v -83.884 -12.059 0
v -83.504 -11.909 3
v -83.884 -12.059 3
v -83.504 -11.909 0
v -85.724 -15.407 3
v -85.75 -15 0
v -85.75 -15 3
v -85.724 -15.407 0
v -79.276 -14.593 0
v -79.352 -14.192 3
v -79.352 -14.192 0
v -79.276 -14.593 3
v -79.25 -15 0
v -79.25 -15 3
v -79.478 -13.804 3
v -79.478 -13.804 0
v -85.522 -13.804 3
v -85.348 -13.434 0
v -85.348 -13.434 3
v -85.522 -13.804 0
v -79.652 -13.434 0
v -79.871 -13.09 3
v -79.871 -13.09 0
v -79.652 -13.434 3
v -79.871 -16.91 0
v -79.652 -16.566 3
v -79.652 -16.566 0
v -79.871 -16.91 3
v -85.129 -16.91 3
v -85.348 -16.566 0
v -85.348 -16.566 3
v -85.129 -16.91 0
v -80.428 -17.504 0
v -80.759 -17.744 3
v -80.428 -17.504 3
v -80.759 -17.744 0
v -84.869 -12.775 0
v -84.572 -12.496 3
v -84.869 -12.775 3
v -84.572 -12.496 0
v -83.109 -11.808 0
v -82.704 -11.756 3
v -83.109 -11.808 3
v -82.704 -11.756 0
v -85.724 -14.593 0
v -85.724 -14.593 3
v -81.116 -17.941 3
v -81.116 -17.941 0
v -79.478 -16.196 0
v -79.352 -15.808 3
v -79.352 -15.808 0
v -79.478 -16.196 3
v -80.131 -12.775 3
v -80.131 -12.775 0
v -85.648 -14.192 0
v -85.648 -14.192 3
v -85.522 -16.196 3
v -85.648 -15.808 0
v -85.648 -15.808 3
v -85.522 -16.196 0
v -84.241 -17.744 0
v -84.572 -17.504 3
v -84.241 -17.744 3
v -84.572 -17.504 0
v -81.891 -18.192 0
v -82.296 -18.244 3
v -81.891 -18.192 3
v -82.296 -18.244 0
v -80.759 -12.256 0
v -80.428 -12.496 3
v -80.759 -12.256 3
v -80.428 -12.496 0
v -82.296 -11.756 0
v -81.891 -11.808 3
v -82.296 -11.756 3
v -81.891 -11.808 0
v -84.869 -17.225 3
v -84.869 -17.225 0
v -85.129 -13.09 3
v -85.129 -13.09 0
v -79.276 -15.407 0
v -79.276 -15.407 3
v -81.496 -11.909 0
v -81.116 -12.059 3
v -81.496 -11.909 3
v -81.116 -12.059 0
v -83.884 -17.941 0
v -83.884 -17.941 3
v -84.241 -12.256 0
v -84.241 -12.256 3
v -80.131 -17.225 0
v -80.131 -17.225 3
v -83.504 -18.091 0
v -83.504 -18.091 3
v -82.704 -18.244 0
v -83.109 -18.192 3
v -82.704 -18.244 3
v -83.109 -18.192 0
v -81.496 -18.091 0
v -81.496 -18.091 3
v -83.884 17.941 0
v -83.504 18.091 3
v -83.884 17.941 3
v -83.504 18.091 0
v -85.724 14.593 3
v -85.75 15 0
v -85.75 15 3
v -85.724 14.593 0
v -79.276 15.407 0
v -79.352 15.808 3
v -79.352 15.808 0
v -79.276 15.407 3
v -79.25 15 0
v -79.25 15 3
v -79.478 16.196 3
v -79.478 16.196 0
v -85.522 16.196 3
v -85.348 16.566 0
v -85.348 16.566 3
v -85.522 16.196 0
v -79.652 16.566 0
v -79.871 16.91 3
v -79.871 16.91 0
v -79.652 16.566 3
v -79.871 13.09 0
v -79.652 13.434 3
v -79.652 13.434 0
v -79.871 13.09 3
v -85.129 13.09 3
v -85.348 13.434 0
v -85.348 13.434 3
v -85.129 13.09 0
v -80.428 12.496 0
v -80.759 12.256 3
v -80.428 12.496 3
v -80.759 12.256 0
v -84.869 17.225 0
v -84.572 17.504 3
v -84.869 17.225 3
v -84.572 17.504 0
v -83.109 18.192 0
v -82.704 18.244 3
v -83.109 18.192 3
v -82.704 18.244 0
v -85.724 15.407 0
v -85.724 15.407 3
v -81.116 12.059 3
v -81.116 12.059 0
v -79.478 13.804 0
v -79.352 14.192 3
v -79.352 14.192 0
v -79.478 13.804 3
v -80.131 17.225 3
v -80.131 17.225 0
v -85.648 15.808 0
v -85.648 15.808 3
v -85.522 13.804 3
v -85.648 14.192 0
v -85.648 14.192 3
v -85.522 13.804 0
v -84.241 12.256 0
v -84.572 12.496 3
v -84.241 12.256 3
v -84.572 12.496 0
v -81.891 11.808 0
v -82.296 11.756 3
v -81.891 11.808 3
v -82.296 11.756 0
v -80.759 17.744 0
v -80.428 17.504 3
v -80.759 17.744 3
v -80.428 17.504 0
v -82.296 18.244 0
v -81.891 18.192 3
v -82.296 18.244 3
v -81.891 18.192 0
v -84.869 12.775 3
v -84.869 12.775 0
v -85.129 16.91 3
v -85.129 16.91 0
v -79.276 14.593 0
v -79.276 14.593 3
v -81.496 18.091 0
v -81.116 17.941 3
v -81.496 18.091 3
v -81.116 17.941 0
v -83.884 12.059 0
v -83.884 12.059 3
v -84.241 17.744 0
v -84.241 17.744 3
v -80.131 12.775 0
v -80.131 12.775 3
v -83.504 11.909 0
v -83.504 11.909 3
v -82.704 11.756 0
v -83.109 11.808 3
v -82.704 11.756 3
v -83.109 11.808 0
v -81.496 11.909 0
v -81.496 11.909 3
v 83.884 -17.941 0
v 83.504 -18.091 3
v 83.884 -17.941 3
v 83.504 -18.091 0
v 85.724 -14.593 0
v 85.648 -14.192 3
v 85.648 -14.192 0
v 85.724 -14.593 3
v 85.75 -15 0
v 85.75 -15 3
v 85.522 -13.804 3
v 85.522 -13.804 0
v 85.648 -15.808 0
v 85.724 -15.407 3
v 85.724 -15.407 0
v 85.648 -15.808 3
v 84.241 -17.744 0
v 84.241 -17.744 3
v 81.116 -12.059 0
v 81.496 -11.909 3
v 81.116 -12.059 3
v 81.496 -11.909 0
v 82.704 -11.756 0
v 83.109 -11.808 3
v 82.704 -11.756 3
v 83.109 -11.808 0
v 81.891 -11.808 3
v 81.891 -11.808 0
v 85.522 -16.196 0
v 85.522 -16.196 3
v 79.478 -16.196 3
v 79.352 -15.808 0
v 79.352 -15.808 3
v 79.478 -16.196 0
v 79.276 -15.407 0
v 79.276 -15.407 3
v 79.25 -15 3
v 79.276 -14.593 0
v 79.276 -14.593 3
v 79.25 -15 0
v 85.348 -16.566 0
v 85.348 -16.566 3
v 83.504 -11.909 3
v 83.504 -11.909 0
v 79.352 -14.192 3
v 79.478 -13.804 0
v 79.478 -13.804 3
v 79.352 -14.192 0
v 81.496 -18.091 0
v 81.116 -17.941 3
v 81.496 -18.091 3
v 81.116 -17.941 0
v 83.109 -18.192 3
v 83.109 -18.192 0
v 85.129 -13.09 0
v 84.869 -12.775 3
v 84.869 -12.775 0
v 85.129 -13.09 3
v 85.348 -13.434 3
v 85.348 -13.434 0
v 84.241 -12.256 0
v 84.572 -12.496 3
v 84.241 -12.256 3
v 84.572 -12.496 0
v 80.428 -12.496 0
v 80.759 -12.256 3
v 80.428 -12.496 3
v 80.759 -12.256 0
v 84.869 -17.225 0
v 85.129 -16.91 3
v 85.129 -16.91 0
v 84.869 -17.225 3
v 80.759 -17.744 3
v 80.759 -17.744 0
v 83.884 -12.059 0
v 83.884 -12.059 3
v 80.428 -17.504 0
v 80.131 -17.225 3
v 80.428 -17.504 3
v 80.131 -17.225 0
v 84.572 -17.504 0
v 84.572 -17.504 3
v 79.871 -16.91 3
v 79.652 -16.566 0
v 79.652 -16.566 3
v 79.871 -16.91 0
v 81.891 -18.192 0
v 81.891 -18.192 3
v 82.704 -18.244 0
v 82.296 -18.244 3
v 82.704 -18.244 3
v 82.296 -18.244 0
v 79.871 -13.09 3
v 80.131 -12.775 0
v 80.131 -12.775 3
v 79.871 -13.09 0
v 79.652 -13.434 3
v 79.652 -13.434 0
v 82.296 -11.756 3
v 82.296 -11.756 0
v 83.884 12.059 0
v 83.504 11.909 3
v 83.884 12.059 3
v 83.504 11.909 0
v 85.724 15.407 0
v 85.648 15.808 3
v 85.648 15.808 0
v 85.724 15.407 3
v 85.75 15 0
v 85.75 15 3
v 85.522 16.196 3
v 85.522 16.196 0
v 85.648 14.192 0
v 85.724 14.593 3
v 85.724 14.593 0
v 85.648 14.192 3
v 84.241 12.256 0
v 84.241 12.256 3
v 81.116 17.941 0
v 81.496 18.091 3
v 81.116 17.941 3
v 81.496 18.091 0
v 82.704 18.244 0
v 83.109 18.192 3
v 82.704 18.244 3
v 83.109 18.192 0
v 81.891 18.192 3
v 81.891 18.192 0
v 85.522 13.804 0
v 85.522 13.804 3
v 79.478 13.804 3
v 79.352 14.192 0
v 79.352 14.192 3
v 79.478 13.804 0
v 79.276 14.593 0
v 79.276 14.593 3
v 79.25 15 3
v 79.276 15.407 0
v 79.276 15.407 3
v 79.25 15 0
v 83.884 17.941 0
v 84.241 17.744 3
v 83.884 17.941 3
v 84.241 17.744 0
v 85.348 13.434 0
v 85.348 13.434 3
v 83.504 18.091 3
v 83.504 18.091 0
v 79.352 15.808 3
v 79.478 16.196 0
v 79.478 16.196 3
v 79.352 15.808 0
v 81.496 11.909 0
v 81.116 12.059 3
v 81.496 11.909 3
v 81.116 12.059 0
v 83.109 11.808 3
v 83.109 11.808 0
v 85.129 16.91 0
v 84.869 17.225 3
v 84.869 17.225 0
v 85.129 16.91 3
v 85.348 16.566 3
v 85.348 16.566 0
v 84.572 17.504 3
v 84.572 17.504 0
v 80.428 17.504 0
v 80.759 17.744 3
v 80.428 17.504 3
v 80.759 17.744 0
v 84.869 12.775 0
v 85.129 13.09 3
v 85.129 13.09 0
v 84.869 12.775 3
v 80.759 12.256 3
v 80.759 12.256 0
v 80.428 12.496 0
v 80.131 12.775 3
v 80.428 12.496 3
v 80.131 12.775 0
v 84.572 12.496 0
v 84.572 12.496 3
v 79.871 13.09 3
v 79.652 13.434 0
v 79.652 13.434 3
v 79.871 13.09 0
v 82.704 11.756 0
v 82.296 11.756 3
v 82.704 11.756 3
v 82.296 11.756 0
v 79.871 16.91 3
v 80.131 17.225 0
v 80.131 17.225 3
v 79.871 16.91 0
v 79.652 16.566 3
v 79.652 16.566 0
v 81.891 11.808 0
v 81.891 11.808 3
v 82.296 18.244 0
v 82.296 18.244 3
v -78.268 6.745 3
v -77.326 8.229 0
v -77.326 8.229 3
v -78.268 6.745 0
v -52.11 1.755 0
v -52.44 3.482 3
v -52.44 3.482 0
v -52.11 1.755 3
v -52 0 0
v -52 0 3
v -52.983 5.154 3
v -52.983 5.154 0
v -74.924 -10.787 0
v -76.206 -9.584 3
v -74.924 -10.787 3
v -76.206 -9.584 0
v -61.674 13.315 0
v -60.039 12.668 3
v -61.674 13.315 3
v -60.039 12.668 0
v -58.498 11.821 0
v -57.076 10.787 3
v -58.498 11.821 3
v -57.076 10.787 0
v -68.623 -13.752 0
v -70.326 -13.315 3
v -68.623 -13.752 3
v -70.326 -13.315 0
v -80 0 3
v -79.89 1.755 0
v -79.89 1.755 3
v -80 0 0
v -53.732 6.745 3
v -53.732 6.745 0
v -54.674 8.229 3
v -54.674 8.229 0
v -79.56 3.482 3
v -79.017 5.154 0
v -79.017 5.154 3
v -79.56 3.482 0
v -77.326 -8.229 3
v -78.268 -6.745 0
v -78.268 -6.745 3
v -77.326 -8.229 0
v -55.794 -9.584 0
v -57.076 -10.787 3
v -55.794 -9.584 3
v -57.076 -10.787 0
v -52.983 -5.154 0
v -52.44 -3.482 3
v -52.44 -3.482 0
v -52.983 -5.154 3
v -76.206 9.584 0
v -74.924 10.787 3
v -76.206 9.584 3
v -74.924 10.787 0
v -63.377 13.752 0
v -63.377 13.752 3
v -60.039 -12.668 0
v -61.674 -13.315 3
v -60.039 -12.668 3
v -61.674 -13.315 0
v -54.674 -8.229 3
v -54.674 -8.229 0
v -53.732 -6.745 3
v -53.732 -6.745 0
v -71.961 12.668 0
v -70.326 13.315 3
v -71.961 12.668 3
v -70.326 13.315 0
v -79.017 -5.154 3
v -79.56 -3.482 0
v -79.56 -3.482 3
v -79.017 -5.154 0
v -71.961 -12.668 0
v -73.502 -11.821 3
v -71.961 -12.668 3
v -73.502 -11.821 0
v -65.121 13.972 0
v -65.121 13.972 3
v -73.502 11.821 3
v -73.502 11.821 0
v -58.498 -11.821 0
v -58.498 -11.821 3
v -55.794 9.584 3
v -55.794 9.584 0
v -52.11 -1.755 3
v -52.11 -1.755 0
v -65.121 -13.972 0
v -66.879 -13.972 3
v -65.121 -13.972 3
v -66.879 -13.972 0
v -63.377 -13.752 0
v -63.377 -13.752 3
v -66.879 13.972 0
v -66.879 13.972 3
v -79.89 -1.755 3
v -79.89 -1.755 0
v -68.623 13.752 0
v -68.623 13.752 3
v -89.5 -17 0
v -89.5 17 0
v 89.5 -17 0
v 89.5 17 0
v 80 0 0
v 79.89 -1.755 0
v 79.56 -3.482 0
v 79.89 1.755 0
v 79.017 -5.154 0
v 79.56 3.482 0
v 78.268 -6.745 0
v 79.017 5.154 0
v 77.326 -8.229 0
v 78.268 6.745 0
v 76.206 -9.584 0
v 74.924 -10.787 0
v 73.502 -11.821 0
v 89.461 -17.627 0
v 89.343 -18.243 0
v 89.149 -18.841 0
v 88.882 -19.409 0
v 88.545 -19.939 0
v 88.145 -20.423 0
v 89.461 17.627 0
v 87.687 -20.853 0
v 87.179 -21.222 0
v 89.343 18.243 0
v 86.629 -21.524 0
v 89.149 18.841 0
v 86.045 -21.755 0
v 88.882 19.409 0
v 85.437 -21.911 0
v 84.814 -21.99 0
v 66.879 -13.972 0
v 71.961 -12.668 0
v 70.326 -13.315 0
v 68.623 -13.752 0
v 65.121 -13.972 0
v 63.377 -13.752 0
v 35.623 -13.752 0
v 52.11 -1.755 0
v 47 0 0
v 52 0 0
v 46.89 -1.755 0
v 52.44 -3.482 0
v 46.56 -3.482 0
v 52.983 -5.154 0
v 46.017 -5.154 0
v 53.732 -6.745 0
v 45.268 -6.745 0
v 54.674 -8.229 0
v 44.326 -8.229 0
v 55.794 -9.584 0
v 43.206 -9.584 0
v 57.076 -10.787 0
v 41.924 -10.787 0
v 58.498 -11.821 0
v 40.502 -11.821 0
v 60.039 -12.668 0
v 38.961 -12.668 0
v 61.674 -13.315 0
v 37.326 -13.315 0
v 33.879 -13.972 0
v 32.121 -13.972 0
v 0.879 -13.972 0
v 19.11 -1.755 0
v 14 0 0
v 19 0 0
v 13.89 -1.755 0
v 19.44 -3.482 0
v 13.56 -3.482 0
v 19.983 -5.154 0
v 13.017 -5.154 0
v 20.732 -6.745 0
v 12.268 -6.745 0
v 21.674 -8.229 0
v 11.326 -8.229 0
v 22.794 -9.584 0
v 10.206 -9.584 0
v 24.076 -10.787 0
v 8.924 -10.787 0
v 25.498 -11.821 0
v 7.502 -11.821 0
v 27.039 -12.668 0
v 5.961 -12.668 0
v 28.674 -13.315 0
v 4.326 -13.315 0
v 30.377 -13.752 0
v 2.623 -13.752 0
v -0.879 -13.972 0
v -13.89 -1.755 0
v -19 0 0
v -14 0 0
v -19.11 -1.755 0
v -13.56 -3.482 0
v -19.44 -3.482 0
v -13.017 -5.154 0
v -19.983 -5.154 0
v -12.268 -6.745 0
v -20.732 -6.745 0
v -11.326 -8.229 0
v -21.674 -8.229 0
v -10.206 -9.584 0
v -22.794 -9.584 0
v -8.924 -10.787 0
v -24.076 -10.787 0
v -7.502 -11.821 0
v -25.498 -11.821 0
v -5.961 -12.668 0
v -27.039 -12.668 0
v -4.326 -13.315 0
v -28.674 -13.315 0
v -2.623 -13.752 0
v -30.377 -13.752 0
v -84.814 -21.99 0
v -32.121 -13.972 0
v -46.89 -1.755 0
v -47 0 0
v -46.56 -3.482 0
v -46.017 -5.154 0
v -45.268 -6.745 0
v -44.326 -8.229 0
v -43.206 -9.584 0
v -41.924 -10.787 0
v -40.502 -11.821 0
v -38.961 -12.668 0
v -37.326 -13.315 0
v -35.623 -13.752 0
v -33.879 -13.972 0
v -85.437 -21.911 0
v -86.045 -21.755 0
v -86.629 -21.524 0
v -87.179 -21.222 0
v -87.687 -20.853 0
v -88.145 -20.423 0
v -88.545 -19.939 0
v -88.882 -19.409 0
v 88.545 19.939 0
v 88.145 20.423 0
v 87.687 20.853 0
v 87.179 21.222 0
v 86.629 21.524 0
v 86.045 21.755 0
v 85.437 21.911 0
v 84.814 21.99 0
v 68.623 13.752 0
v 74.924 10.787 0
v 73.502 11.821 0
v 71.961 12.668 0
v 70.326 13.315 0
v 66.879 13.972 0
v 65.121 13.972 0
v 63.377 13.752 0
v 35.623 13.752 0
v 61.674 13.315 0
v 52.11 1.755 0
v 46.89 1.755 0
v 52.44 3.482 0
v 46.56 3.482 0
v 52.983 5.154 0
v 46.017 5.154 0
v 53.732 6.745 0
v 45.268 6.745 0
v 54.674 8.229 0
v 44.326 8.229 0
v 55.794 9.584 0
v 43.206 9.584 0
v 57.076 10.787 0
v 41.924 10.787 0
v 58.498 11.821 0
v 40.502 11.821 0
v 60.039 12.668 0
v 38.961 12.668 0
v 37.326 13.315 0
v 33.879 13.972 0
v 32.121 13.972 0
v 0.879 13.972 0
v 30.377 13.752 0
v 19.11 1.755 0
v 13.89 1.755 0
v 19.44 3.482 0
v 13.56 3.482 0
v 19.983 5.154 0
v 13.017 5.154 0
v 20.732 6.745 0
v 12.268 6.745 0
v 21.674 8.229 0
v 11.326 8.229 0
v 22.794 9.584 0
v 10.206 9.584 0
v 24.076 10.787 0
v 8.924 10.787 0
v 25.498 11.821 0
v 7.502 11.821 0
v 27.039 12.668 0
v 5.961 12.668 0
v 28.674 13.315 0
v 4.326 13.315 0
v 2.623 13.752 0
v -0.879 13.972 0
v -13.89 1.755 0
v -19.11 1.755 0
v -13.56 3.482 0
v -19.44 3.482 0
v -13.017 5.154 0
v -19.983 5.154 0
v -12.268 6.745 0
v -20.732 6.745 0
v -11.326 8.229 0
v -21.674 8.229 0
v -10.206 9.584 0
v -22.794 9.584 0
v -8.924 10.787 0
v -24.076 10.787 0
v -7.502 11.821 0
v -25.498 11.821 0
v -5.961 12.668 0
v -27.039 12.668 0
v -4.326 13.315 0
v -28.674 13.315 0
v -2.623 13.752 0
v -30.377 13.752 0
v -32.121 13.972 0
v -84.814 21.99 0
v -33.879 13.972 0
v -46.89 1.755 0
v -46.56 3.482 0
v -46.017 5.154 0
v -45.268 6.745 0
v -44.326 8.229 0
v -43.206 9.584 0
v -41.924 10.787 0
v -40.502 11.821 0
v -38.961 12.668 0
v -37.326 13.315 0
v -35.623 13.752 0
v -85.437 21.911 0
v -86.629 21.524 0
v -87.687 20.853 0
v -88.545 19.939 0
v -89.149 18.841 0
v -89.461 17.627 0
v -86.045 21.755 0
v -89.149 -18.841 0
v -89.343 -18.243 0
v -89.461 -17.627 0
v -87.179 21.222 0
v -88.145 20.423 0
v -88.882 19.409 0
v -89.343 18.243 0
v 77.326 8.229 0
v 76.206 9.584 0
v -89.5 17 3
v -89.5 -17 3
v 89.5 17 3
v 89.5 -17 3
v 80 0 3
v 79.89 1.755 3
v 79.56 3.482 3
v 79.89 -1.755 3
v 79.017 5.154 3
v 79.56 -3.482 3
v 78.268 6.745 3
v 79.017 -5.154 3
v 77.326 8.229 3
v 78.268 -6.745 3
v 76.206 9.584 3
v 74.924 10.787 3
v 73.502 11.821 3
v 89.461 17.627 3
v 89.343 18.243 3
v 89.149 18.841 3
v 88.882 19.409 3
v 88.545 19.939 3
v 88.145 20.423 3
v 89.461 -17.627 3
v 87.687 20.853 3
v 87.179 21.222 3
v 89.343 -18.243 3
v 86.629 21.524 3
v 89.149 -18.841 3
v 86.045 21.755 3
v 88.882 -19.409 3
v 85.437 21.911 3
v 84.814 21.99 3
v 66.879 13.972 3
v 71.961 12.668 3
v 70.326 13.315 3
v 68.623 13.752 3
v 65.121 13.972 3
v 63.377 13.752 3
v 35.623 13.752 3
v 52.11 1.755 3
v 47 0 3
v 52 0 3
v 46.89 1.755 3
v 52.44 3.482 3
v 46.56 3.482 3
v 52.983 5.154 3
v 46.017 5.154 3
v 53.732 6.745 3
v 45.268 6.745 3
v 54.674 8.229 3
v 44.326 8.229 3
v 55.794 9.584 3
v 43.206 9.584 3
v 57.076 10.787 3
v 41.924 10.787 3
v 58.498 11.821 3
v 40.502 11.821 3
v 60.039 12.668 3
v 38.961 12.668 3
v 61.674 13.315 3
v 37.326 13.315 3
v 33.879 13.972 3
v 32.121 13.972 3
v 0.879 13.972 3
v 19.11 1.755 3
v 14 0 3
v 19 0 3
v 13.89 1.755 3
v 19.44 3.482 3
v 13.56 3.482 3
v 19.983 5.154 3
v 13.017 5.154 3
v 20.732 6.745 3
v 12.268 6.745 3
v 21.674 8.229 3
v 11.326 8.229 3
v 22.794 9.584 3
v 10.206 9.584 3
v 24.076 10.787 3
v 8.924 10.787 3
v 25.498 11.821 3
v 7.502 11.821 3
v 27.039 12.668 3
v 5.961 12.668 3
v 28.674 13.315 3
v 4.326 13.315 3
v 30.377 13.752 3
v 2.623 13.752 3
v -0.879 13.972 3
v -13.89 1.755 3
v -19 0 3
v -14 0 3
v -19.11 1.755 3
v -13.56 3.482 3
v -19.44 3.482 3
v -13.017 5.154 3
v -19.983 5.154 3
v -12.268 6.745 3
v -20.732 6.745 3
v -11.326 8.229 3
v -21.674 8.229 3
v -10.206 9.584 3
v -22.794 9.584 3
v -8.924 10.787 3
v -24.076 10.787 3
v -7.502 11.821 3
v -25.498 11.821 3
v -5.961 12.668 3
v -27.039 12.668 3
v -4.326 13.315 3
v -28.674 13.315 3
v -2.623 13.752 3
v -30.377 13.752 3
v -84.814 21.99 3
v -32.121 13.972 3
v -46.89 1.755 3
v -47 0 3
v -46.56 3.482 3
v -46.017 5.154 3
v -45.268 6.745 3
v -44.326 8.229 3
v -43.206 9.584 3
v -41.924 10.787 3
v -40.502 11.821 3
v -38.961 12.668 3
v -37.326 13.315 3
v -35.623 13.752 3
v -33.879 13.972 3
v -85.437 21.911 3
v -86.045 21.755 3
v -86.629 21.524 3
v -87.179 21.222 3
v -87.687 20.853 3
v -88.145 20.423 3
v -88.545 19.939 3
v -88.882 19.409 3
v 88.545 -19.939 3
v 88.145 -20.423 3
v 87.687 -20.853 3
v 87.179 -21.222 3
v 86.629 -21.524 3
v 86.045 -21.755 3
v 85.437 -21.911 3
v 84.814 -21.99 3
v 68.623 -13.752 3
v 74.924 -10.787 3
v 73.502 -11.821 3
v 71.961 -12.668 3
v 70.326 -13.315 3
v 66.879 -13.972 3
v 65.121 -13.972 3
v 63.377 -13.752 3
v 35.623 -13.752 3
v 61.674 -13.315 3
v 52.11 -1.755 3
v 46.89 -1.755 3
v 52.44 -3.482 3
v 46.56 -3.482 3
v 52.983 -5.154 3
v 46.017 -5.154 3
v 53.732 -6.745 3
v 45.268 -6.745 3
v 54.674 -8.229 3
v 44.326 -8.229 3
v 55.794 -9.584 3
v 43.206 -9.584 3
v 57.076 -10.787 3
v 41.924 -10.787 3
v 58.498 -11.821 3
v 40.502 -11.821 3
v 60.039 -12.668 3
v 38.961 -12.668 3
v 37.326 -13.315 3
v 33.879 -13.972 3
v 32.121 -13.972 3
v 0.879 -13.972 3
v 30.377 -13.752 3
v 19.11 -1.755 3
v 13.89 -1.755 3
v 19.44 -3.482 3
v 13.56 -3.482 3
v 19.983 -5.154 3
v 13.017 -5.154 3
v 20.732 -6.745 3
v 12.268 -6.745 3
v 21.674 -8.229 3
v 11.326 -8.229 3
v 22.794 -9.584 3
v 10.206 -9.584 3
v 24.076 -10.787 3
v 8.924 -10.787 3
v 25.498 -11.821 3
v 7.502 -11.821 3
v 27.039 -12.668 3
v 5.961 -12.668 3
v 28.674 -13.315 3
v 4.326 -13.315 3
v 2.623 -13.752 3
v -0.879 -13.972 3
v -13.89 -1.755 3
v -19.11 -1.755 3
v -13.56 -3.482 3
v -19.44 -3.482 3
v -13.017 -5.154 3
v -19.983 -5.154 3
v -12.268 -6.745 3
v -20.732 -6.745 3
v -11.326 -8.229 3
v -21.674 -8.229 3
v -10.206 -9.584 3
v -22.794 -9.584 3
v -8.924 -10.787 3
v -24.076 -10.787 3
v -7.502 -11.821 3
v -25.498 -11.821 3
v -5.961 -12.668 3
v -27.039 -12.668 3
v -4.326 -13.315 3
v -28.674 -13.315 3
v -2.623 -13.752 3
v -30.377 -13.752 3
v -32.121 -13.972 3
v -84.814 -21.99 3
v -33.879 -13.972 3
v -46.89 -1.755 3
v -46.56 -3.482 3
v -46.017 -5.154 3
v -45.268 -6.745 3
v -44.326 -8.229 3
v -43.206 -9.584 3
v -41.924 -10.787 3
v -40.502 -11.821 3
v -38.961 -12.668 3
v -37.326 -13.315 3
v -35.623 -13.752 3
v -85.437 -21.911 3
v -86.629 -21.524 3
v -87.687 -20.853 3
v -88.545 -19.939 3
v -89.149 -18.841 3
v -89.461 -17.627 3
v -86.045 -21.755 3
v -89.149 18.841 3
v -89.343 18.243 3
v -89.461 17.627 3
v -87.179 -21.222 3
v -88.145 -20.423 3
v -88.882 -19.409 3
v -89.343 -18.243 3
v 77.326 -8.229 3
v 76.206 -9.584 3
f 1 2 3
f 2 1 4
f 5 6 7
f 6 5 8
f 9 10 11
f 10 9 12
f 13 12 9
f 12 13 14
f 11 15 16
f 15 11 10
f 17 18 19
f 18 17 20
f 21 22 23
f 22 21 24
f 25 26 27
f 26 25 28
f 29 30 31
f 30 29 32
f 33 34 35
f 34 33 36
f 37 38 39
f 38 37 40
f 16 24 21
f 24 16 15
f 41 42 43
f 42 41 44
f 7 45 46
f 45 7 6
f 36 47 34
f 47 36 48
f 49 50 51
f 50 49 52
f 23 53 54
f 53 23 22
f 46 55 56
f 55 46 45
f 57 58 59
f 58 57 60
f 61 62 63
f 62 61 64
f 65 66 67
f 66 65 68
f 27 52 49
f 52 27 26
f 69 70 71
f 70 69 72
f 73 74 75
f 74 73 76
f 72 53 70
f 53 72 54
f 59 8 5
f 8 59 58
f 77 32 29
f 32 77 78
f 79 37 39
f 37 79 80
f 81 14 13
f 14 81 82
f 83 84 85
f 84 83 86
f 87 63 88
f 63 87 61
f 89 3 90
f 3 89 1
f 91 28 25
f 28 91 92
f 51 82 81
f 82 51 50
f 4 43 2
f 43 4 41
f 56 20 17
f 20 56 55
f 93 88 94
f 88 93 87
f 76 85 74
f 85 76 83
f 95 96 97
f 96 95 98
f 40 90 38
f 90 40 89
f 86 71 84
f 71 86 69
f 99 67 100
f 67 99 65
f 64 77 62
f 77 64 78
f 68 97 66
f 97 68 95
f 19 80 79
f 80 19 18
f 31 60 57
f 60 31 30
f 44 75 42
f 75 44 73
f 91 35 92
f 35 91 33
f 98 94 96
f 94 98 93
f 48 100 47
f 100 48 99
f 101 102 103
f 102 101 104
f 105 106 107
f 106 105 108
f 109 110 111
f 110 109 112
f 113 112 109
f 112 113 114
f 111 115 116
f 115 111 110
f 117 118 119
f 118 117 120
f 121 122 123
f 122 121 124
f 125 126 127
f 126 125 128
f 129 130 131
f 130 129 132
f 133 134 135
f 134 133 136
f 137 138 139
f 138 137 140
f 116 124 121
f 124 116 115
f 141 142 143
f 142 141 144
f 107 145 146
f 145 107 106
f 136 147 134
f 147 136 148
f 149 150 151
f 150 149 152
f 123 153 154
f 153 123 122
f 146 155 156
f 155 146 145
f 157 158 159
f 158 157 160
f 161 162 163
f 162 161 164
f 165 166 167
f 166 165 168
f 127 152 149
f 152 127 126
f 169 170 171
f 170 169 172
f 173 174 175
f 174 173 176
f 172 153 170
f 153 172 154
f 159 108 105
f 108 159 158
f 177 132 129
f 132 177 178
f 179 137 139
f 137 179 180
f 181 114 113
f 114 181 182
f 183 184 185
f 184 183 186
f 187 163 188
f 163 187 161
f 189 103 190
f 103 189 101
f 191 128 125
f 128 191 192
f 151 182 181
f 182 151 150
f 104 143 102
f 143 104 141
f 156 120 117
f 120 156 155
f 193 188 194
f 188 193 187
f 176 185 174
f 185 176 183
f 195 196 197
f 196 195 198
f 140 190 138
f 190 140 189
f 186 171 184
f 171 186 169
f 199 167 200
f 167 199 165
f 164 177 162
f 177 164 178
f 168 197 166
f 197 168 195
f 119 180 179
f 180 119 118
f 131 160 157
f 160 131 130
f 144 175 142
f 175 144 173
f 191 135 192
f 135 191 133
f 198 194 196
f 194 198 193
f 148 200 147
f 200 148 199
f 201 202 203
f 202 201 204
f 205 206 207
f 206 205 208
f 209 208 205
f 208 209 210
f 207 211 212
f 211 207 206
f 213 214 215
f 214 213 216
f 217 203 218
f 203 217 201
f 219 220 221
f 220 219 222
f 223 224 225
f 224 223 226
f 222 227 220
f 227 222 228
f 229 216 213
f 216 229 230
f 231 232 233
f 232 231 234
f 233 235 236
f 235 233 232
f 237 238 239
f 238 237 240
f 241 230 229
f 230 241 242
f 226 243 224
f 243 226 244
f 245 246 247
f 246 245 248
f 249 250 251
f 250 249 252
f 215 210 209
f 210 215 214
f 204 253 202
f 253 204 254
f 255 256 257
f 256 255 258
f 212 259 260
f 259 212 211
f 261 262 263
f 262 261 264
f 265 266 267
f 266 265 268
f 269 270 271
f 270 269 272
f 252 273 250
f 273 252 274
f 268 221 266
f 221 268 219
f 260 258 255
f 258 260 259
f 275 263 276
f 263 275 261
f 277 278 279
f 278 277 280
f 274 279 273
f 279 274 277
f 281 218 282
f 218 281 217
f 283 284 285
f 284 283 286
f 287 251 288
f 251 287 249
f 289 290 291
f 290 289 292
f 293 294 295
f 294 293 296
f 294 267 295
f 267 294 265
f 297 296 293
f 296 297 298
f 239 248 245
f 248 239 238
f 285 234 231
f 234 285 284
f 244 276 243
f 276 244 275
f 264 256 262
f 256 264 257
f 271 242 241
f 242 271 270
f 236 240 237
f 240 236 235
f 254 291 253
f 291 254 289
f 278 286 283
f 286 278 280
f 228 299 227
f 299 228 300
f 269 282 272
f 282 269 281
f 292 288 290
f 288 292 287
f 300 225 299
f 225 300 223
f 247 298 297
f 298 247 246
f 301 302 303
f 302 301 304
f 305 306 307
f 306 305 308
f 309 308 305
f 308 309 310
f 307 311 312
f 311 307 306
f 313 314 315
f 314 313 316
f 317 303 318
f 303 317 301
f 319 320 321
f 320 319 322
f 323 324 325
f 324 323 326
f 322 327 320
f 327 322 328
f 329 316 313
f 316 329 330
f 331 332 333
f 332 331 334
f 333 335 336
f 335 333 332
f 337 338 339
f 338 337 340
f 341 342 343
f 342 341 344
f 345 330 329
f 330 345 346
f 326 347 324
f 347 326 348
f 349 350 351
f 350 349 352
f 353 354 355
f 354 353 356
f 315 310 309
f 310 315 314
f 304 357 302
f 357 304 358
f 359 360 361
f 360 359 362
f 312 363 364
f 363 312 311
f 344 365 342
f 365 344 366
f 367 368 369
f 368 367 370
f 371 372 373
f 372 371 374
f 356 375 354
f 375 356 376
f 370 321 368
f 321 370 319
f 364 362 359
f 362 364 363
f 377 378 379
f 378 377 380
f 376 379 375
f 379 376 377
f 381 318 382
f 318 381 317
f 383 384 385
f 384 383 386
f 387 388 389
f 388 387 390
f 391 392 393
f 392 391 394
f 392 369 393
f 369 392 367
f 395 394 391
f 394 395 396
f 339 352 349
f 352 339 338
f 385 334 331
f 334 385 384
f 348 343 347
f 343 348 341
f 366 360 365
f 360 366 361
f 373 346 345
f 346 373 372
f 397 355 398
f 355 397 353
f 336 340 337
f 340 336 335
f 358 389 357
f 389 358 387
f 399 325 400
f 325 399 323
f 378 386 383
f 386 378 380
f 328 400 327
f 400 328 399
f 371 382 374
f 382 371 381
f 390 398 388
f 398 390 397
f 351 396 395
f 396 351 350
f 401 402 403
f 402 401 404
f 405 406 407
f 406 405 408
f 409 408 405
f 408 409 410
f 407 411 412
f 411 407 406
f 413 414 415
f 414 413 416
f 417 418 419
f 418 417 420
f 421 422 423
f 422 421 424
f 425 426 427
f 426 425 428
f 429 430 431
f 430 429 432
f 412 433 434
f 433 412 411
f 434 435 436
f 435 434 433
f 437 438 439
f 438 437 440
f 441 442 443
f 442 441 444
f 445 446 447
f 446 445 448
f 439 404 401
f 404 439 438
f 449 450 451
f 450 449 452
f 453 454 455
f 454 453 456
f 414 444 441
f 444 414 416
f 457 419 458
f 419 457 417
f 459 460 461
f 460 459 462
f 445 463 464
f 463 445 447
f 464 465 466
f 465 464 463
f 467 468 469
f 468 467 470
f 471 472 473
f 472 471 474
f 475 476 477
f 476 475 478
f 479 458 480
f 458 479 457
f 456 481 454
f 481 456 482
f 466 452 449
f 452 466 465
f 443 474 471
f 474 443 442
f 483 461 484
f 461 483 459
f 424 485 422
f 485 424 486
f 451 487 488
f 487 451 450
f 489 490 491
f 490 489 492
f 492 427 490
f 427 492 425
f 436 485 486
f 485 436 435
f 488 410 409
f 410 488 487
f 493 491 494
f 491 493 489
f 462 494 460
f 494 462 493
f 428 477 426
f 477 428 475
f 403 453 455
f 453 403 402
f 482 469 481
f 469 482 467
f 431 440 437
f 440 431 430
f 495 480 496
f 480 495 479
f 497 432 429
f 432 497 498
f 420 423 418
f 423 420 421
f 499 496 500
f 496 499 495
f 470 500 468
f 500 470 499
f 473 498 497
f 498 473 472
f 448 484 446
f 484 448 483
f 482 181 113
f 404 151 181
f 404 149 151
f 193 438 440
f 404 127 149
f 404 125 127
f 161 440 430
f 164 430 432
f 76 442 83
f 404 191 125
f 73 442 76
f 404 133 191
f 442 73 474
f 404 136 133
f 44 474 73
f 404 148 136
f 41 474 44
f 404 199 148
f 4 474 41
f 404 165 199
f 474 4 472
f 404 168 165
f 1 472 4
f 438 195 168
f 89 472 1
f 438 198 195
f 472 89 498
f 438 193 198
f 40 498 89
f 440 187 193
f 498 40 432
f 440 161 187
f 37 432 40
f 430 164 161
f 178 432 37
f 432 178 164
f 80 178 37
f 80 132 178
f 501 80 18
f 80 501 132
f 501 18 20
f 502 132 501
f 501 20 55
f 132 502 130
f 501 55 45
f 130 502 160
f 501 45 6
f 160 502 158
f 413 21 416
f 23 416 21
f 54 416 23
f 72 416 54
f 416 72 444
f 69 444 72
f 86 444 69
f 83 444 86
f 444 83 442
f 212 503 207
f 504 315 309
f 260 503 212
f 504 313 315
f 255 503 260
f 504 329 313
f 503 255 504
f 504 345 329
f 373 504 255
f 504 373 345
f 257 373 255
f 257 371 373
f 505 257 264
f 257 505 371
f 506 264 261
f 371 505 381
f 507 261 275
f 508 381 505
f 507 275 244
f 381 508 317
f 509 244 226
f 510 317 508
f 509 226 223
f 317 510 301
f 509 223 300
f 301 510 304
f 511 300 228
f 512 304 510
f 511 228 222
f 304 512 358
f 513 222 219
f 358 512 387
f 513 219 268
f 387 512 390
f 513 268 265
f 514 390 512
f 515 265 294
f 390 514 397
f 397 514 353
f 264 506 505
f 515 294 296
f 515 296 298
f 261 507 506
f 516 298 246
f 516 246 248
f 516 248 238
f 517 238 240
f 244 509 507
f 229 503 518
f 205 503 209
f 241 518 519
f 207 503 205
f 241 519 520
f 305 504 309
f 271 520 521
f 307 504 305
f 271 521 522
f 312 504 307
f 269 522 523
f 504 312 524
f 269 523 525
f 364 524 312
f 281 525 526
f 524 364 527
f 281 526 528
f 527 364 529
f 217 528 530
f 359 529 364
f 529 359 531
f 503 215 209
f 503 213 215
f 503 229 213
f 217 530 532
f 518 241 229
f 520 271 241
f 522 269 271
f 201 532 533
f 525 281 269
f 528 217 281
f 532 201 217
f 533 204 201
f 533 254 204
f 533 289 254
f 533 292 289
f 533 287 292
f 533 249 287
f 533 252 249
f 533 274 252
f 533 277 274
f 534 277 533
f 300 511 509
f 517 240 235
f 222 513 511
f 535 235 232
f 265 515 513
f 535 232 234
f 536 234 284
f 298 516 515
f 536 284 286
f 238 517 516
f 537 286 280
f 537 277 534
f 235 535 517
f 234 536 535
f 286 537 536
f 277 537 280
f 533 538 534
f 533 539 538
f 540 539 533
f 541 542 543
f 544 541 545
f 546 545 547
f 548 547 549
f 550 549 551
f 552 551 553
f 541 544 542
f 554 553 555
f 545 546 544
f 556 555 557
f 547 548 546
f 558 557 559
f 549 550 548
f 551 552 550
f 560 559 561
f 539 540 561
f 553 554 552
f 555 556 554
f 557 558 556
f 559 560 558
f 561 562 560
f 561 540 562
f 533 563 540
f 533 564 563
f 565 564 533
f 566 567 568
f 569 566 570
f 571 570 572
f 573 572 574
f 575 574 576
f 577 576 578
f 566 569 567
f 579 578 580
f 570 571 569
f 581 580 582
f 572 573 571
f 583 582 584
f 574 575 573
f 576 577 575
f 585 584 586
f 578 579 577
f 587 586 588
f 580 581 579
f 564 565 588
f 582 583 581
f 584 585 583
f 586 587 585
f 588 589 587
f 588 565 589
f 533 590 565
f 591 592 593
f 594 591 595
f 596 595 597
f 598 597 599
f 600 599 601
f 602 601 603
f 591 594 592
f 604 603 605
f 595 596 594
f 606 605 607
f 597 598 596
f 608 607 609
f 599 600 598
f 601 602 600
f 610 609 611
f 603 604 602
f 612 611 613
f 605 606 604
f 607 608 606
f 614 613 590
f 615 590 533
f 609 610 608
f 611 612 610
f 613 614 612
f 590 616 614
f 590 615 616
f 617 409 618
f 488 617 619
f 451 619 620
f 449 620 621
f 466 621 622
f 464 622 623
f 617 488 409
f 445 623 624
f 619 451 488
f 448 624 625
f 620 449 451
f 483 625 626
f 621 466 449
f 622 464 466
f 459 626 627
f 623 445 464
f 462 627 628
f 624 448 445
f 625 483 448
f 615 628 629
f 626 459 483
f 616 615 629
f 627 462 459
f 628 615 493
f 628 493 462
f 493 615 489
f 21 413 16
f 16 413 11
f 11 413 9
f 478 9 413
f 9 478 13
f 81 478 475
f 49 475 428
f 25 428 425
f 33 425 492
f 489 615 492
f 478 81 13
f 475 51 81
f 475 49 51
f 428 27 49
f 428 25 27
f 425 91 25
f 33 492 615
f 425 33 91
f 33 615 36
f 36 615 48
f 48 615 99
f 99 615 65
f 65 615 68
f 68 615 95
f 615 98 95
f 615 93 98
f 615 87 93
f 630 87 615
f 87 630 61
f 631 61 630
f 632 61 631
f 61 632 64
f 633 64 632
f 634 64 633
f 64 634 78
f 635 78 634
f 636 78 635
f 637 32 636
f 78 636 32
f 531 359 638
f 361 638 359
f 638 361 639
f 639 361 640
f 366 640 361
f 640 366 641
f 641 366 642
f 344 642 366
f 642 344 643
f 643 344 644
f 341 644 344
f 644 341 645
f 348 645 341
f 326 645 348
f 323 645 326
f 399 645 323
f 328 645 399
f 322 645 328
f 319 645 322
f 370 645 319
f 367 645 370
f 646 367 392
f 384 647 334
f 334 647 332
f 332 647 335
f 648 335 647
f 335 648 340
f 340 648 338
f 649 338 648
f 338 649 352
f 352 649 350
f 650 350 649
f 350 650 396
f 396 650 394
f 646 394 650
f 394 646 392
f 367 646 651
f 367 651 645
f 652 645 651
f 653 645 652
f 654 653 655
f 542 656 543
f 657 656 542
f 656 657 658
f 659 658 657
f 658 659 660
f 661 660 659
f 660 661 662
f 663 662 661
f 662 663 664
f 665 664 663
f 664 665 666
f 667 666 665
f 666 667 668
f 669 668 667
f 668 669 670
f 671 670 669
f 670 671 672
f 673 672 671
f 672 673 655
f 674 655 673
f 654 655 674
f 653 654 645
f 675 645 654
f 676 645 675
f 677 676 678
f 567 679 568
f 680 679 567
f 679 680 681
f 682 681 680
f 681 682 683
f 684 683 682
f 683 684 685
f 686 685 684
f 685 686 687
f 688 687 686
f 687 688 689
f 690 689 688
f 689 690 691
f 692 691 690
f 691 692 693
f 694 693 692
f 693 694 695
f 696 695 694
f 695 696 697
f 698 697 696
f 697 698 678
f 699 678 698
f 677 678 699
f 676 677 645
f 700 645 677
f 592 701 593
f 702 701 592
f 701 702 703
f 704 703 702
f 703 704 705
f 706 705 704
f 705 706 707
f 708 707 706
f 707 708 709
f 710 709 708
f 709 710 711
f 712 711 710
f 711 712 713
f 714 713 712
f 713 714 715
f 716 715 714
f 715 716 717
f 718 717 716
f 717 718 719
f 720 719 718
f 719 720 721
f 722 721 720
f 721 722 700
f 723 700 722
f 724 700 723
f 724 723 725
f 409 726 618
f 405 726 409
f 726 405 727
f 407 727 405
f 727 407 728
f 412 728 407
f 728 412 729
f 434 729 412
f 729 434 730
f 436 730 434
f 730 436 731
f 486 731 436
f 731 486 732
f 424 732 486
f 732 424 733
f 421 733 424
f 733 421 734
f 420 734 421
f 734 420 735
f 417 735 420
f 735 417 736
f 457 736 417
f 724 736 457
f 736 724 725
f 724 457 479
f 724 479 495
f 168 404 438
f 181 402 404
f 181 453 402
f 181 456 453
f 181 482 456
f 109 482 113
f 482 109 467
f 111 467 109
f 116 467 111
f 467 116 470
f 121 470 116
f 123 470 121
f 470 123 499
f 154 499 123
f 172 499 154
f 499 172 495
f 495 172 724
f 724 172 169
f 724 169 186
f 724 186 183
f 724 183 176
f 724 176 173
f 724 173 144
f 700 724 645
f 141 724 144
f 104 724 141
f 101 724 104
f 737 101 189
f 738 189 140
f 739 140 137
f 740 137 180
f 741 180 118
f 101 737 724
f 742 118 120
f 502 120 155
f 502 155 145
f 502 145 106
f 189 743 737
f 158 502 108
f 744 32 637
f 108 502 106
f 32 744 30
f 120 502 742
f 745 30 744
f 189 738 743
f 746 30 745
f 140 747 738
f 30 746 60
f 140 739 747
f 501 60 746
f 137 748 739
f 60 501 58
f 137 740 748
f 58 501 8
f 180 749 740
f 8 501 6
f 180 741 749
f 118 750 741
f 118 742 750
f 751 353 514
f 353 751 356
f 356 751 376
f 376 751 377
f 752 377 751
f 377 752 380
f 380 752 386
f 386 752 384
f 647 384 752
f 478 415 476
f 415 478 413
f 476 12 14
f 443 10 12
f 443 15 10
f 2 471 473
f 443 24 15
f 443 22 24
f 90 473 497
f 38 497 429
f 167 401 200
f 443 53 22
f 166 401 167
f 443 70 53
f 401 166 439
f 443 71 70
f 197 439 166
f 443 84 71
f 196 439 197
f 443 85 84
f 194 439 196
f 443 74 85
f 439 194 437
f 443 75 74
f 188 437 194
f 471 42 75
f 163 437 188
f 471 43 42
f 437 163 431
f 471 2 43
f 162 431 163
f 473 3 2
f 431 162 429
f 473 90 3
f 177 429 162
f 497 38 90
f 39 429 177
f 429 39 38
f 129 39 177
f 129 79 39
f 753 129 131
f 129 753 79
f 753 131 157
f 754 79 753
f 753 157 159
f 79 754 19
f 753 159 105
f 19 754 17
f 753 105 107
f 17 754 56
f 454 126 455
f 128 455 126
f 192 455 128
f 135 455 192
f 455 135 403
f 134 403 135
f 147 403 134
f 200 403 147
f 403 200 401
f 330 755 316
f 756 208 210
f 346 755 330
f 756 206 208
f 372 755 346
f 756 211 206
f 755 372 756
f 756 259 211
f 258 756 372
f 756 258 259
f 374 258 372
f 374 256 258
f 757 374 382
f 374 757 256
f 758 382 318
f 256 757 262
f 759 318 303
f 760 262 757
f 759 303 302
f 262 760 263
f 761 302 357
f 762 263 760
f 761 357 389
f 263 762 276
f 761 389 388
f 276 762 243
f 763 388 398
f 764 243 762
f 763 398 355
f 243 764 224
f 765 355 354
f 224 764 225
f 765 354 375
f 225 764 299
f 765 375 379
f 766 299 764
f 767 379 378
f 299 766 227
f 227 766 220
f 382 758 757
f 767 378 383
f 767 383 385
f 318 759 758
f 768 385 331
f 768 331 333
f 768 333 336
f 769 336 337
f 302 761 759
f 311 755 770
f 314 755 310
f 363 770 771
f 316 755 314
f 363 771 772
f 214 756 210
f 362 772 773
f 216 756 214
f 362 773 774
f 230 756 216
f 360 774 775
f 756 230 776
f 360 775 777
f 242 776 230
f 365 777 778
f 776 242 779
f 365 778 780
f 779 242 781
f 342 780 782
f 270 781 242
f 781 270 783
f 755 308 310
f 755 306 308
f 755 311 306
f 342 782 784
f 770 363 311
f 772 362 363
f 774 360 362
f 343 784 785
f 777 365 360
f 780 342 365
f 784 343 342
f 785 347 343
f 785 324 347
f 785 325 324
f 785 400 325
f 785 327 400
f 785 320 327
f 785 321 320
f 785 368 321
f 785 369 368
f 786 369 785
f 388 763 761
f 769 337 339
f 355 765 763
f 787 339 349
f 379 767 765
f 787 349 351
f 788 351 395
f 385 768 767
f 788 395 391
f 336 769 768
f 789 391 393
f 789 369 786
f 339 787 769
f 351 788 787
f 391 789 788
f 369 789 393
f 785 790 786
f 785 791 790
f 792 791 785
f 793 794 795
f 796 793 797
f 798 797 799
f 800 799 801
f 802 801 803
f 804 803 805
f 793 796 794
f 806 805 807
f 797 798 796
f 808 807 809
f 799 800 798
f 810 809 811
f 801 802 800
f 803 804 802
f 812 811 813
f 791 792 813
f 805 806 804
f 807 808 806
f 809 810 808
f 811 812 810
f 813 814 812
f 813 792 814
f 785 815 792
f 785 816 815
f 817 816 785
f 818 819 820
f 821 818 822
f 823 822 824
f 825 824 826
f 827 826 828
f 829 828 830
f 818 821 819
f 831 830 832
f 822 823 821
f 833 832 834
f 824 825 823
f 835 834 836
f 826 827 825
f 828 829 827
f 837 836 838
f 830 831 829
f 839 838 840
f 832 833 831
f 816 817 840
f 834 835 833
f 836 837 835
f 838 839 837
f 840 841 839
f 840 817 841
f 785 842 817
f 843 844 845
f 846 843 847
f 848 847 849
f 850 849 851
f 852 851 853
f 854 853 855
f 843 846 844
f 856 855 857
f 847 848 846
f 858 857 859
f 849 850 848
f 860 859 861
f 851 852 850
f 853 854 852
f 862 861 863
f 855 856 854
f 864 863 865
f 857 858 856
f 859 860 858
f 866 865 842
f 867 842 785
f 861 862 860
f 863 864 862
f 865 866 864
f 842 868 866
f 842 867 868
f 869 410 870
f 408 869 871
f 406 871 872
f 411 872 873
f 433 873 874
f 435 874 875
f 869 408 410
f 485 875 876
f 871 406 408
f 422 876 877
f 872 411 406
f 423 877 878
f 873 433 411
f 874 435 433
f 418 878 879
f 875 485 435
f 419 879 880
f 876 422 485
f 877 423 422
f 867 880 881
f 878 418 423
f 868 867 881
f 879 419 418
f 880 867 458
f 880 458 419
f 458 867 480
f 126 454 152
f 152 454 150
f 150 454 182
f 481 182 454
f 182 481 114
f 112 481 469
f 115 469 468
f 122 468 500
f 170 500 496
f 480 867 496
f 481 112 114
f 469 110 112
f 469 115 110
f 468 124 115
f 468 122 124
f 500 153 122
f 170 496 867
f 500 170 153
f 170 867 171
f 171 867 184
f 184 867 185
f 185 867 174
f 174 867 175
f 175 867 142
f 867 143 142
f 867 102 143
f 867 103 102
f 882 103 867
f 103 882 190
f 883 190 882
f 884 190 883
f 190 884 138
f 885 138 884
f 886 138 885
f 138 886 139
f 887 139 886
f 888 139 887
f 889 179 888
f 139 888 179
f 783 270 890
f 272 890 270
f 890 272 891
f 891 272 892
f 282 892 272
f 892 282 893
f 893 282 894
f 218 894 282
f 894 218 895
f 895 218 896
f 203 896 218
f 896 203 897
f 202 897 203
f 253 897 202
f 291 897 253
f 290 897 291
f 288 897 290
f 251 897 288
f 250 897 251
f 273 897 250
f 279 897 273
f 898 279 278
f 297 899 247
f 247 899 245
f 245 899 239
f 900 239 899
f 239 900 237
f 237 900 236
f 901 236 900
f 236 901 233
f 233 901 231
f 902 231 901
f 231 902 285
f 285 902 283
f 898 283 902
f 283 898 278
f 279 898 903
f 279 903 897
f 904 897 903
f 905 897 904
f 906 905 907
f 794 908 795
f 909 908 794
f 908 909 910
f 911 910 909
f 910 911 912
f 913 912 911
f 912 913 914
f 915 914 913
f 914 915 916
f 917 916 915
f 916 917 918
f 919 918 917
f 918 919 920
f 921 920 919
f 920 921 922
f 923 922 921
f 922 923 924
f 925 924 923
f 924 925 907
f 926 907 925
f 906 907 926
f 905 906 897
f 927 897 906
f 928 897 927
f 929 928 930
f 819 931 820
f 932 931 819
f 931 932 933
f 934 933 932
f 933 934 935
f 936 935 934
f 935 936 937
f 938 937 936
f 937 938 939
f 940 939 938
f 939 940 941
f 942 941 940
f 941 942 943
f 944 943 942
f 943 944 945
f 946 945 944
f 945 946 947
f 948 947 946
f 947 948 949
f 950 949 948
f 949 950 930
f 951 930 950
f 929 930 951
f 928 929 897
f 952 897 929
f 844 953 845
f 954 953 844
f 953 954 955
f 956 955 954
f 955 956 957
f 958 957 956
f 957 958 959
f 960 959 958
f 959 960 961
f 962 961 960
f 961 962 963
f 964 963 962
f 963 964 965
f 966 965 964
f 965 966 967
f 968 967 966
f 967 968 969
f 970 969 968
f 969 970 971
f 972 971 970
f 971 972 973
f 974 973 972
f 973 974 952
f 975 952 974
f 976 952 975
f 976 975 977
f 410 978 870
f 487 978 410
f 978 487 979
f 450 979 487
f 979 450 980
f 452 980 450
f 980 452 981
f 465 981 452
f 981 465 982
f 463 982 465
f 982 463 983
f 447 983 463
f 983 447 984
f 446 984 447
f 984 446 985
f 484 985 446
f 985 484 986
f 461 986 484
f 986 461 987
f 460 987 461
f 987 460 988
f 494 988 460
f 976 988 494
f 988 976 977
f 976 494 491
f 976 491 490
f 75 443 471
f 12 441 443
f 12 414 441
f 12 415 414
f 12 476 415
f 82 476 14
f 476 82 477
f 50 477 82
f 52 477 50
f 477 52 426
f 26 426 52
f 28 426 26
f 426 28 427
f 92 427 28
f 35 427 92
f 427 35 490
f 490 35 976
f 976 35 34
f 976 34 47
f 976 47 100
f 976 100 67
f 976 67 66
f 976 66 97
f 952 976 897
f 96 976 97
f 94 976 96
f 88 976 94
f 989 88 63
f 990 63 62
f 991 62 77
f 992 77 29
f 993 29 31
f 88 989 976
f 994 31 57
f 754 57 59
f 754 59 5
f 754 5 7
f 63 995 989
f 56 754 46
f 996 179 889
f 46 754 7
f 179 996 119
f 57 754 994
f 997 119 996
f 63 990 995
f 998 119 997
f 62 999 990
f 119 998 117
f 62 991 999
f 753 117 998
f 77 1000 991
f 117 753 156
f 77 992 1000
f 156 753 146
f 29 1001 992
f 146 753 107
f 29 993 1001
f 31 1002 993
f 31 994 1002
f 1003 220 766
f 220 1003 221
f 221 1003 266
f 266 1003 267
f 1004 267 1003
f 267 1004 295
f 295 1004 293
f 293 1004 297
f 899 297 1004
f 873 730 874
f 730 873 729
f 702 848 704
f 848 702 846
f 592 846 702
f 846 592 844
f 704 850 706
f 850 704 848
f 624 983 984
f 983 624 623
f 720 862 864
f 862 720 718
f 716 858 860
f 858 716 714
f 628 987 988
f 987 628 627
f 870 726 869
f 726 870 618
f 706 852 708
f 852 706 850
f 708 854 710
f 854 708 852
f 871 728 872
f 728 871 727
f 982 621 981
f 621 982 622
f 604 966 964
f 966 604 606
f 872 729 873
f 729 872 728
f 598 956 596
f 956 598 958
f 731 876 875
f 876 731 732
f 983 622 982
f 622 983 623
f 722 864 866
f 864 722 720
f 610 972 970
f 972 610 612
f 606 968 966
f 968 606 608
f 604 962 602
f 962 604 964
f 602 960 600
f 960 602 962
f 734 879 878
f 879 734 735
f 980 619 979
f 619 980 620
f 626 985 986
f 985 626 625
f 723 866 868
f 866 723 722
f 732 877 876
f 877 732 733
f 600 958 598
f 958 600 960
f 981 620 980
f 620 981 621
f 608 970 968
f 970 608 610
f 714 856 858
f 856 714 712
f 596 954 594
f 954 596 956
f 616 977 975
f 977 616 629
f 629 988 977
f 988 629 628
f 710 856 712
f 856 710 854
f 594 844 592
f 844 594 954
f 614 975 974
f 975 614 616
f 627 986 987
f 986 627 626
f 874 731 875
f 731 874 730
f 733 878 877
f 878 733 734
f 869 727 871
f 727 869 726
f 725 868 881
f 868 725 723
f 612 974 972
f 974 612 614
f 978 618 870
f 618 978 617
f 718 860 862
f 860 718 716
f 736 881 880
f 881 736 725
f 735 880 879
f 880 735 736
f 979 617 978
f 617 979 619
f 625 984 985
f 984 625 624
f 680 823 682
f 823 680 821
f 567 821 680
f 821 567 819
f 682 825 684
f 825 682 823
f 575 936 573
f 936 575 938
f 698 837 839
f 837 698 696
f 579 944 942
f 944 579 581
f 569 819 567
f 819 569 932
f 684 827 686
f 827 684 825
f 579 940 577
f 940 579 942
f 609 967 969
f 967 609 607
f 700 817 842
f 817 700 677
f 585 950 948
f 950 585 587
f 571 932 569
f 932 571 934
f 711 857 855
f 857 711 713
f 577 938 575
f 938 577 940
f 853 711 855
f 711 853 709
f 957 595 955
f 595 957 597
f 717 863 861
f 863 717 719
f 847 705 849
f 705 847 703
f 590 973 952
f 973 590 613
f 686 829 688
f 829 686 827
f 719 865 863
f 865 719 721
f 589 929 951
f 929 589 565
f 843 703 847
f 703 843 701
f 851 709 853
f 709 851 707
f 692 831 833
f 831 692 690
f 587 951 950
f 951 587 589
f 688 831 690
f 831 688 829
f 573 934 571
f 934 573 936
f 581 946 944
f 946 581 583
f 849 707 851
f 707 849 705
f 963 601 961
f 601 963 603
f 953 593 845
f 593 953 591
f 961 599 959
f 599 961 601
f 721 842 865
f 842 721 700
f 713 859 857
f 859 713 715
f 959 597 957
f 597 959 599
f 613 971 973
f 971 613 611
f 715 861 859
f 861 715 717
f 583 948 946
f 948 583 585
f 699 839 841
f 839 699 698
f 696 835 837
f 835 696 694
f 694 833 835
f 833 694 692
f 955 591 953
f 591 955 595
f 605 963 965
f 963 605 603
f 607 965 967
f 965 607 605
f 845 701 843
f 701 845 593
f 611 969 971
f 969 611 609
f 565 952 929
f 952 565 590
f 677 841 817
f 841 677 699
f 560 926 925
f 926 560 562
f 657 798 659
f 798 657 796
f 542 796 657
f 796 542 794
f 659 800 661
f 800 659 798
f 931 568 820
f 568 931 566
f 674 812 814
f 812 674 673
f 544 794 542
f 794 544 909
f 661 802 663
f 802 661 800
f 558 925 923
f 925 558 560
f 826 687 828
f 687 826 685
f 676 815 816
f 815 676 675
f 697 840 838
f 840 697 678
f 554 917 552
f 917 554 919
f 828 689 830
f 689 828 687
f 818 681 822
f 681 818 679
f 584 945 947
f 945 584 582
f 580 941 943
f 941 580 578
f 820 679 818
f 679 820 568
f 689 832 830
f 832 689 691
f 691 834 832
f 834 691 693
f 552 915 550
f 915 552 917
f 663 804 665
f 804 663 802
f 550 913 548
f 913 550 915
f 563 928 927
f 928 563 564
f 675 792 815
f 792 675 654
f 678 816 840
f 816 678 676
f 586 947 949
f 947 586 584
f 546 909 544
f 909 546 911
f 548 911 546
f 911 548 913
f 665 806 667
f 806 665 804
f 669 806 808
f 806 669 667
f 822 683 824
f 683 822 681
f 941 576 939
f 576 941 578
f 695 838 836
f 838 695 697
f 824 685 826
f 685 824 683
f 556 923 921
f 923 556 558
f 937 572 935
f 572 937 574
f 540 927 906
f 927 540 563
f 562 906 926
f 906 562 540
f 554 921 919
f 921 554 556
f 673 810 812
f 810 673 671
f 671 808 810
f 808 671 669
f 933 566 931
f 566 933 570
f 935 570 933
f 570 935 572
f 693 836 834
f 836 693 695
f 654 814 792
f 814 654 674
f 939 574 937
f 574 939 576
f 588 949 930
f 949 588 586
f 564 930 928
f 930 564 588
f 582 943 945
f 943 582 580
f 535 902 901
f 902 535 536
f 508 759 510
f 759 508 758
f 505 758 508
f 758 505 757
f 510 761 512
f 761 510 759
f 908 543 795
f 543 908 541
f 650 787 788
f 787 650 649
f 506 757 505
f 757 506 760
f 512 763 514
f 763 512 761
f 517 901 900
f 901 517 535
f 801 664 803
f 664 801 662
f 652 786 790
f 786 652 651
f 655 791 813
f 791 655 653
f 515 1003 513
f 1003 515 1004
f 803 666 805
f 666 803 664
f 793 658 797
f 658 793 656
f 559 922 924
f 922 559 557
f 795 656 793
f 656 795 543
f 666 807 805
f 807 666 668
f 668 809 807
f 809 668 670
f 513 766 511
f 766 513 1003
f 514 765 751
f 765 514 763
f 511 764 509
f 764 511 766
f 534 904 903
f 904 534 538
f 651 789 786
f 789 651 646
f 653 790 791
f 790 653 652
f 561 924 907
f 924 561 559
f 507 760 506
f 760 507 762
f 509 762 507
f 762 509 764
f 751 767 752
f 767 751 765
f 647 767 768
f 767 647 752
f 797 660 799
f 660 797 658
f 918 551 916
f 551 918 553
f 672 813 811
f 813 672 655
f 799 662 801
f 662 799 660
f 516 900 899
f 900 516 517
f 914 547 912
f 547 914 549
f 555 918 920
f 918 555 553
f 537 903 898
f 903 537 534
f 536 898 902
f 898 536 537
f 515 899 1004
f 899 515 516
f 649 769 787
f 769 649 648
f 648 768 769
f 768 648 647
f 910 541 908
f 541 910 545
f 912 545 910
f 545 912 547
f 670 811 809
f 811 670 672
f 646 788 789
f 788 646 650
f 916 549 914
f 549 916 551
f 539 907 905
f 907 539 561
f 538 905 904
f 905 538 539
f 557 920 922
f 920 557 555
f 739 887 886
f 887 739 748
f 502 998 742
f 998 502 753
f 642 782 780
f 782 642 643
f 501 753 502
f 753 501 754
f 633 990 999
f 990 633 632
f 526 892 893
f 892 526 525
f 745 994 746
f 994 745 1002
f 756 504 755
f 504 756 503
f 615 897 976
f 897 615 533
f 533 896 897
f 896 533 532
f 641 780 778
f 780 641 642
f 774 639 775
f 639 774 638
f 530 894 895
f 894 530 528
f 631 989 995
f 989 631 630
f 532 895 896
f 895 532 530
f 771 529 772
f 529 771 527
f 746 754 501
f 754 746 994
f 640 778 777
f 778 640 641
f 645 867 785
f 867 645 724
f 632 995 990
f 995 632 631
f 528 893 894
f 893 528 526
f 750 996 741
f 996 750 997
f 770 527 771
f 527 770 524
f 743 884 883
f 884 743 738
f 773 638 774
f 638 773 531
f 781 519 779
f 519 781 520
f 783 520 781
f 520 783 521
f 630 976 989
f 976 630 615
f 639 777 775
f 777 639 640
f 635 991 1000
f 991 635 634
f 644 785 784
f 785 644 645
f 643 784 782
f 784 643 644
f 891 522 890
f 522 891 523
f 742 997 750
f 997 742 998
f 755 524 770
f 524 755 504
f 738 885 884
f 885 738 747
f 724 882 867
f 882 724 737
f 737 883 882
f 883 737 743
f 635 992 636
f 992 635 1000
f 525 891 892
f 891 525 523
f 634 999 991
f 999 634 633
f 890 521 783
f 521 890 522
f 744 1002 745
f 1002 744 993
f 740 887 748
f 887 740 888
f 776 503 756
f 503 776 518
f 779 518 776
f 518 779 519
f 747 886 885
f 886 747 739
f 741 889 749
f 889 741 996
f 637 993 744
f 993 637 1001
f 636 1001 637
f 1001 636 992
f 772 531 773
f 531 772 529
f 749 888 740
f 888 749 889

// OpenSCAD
$fn = 50;


difference() {
	union() {
		hull() {
			translate(v = [-84.5000000000, 17.0000000000, 0]) {
				cylinder(h = 3, r = 5);
			}
			translate(v = [84.5000000000, 17.0000000000, 0]) {
				cylinder(h = 3, r = 5);
			}
			translate(v = [-84.5000000000, -17.0000000000, 0]) {
				cylinder(h = 3, r = 5);
			}
			translate(v = [84.5000000000, -17.0000000000, 0]) {
				cylinder(h = 3, r = 5);
			}
		}
	}
	union() {
		#translate(v = [-82.5000000000, -15.0000000000, -100.0000000000]) {
			cylinder(h = 200, r = 3.2500000000);
		}
		#translate(v = [-82.5000000000, 15.0000000000, -100.0000000000]) {
			cylinder(h = 200, r = 3.2500000000);
		}
		#translate(v = [82.5000000000, -15.0000000000, -100.0000000000]) {
			cylinder(h = 200, r = 3.2500000000);
		}
		#translate(v = [82.5000000000, 15.0000000000, -100.0000000000]) {
			cylinder(h = 200, r = 3.2500000000);
		}
		#translate(v = [-66.0000000000, 0, 0]) {
			cylinder(h = 3, r = 14.0000000000);
		}
		#translate(v = [-33.0000000000, 0, 0]) {
			cylinder(h = 3, r = 14.0000000000);
		}
		#cylinder(h = 3, r = 14.0000000000);
		#translate(v = [33.0000000000, 0, 0]) {
			cylinder(h = 3, r = 14.0000000000);
		}
		#translate(v = [66.0000000000, 0, 0]) {
			cylinder(h = 3, r = 14.0000000000);
		}
	}
}
